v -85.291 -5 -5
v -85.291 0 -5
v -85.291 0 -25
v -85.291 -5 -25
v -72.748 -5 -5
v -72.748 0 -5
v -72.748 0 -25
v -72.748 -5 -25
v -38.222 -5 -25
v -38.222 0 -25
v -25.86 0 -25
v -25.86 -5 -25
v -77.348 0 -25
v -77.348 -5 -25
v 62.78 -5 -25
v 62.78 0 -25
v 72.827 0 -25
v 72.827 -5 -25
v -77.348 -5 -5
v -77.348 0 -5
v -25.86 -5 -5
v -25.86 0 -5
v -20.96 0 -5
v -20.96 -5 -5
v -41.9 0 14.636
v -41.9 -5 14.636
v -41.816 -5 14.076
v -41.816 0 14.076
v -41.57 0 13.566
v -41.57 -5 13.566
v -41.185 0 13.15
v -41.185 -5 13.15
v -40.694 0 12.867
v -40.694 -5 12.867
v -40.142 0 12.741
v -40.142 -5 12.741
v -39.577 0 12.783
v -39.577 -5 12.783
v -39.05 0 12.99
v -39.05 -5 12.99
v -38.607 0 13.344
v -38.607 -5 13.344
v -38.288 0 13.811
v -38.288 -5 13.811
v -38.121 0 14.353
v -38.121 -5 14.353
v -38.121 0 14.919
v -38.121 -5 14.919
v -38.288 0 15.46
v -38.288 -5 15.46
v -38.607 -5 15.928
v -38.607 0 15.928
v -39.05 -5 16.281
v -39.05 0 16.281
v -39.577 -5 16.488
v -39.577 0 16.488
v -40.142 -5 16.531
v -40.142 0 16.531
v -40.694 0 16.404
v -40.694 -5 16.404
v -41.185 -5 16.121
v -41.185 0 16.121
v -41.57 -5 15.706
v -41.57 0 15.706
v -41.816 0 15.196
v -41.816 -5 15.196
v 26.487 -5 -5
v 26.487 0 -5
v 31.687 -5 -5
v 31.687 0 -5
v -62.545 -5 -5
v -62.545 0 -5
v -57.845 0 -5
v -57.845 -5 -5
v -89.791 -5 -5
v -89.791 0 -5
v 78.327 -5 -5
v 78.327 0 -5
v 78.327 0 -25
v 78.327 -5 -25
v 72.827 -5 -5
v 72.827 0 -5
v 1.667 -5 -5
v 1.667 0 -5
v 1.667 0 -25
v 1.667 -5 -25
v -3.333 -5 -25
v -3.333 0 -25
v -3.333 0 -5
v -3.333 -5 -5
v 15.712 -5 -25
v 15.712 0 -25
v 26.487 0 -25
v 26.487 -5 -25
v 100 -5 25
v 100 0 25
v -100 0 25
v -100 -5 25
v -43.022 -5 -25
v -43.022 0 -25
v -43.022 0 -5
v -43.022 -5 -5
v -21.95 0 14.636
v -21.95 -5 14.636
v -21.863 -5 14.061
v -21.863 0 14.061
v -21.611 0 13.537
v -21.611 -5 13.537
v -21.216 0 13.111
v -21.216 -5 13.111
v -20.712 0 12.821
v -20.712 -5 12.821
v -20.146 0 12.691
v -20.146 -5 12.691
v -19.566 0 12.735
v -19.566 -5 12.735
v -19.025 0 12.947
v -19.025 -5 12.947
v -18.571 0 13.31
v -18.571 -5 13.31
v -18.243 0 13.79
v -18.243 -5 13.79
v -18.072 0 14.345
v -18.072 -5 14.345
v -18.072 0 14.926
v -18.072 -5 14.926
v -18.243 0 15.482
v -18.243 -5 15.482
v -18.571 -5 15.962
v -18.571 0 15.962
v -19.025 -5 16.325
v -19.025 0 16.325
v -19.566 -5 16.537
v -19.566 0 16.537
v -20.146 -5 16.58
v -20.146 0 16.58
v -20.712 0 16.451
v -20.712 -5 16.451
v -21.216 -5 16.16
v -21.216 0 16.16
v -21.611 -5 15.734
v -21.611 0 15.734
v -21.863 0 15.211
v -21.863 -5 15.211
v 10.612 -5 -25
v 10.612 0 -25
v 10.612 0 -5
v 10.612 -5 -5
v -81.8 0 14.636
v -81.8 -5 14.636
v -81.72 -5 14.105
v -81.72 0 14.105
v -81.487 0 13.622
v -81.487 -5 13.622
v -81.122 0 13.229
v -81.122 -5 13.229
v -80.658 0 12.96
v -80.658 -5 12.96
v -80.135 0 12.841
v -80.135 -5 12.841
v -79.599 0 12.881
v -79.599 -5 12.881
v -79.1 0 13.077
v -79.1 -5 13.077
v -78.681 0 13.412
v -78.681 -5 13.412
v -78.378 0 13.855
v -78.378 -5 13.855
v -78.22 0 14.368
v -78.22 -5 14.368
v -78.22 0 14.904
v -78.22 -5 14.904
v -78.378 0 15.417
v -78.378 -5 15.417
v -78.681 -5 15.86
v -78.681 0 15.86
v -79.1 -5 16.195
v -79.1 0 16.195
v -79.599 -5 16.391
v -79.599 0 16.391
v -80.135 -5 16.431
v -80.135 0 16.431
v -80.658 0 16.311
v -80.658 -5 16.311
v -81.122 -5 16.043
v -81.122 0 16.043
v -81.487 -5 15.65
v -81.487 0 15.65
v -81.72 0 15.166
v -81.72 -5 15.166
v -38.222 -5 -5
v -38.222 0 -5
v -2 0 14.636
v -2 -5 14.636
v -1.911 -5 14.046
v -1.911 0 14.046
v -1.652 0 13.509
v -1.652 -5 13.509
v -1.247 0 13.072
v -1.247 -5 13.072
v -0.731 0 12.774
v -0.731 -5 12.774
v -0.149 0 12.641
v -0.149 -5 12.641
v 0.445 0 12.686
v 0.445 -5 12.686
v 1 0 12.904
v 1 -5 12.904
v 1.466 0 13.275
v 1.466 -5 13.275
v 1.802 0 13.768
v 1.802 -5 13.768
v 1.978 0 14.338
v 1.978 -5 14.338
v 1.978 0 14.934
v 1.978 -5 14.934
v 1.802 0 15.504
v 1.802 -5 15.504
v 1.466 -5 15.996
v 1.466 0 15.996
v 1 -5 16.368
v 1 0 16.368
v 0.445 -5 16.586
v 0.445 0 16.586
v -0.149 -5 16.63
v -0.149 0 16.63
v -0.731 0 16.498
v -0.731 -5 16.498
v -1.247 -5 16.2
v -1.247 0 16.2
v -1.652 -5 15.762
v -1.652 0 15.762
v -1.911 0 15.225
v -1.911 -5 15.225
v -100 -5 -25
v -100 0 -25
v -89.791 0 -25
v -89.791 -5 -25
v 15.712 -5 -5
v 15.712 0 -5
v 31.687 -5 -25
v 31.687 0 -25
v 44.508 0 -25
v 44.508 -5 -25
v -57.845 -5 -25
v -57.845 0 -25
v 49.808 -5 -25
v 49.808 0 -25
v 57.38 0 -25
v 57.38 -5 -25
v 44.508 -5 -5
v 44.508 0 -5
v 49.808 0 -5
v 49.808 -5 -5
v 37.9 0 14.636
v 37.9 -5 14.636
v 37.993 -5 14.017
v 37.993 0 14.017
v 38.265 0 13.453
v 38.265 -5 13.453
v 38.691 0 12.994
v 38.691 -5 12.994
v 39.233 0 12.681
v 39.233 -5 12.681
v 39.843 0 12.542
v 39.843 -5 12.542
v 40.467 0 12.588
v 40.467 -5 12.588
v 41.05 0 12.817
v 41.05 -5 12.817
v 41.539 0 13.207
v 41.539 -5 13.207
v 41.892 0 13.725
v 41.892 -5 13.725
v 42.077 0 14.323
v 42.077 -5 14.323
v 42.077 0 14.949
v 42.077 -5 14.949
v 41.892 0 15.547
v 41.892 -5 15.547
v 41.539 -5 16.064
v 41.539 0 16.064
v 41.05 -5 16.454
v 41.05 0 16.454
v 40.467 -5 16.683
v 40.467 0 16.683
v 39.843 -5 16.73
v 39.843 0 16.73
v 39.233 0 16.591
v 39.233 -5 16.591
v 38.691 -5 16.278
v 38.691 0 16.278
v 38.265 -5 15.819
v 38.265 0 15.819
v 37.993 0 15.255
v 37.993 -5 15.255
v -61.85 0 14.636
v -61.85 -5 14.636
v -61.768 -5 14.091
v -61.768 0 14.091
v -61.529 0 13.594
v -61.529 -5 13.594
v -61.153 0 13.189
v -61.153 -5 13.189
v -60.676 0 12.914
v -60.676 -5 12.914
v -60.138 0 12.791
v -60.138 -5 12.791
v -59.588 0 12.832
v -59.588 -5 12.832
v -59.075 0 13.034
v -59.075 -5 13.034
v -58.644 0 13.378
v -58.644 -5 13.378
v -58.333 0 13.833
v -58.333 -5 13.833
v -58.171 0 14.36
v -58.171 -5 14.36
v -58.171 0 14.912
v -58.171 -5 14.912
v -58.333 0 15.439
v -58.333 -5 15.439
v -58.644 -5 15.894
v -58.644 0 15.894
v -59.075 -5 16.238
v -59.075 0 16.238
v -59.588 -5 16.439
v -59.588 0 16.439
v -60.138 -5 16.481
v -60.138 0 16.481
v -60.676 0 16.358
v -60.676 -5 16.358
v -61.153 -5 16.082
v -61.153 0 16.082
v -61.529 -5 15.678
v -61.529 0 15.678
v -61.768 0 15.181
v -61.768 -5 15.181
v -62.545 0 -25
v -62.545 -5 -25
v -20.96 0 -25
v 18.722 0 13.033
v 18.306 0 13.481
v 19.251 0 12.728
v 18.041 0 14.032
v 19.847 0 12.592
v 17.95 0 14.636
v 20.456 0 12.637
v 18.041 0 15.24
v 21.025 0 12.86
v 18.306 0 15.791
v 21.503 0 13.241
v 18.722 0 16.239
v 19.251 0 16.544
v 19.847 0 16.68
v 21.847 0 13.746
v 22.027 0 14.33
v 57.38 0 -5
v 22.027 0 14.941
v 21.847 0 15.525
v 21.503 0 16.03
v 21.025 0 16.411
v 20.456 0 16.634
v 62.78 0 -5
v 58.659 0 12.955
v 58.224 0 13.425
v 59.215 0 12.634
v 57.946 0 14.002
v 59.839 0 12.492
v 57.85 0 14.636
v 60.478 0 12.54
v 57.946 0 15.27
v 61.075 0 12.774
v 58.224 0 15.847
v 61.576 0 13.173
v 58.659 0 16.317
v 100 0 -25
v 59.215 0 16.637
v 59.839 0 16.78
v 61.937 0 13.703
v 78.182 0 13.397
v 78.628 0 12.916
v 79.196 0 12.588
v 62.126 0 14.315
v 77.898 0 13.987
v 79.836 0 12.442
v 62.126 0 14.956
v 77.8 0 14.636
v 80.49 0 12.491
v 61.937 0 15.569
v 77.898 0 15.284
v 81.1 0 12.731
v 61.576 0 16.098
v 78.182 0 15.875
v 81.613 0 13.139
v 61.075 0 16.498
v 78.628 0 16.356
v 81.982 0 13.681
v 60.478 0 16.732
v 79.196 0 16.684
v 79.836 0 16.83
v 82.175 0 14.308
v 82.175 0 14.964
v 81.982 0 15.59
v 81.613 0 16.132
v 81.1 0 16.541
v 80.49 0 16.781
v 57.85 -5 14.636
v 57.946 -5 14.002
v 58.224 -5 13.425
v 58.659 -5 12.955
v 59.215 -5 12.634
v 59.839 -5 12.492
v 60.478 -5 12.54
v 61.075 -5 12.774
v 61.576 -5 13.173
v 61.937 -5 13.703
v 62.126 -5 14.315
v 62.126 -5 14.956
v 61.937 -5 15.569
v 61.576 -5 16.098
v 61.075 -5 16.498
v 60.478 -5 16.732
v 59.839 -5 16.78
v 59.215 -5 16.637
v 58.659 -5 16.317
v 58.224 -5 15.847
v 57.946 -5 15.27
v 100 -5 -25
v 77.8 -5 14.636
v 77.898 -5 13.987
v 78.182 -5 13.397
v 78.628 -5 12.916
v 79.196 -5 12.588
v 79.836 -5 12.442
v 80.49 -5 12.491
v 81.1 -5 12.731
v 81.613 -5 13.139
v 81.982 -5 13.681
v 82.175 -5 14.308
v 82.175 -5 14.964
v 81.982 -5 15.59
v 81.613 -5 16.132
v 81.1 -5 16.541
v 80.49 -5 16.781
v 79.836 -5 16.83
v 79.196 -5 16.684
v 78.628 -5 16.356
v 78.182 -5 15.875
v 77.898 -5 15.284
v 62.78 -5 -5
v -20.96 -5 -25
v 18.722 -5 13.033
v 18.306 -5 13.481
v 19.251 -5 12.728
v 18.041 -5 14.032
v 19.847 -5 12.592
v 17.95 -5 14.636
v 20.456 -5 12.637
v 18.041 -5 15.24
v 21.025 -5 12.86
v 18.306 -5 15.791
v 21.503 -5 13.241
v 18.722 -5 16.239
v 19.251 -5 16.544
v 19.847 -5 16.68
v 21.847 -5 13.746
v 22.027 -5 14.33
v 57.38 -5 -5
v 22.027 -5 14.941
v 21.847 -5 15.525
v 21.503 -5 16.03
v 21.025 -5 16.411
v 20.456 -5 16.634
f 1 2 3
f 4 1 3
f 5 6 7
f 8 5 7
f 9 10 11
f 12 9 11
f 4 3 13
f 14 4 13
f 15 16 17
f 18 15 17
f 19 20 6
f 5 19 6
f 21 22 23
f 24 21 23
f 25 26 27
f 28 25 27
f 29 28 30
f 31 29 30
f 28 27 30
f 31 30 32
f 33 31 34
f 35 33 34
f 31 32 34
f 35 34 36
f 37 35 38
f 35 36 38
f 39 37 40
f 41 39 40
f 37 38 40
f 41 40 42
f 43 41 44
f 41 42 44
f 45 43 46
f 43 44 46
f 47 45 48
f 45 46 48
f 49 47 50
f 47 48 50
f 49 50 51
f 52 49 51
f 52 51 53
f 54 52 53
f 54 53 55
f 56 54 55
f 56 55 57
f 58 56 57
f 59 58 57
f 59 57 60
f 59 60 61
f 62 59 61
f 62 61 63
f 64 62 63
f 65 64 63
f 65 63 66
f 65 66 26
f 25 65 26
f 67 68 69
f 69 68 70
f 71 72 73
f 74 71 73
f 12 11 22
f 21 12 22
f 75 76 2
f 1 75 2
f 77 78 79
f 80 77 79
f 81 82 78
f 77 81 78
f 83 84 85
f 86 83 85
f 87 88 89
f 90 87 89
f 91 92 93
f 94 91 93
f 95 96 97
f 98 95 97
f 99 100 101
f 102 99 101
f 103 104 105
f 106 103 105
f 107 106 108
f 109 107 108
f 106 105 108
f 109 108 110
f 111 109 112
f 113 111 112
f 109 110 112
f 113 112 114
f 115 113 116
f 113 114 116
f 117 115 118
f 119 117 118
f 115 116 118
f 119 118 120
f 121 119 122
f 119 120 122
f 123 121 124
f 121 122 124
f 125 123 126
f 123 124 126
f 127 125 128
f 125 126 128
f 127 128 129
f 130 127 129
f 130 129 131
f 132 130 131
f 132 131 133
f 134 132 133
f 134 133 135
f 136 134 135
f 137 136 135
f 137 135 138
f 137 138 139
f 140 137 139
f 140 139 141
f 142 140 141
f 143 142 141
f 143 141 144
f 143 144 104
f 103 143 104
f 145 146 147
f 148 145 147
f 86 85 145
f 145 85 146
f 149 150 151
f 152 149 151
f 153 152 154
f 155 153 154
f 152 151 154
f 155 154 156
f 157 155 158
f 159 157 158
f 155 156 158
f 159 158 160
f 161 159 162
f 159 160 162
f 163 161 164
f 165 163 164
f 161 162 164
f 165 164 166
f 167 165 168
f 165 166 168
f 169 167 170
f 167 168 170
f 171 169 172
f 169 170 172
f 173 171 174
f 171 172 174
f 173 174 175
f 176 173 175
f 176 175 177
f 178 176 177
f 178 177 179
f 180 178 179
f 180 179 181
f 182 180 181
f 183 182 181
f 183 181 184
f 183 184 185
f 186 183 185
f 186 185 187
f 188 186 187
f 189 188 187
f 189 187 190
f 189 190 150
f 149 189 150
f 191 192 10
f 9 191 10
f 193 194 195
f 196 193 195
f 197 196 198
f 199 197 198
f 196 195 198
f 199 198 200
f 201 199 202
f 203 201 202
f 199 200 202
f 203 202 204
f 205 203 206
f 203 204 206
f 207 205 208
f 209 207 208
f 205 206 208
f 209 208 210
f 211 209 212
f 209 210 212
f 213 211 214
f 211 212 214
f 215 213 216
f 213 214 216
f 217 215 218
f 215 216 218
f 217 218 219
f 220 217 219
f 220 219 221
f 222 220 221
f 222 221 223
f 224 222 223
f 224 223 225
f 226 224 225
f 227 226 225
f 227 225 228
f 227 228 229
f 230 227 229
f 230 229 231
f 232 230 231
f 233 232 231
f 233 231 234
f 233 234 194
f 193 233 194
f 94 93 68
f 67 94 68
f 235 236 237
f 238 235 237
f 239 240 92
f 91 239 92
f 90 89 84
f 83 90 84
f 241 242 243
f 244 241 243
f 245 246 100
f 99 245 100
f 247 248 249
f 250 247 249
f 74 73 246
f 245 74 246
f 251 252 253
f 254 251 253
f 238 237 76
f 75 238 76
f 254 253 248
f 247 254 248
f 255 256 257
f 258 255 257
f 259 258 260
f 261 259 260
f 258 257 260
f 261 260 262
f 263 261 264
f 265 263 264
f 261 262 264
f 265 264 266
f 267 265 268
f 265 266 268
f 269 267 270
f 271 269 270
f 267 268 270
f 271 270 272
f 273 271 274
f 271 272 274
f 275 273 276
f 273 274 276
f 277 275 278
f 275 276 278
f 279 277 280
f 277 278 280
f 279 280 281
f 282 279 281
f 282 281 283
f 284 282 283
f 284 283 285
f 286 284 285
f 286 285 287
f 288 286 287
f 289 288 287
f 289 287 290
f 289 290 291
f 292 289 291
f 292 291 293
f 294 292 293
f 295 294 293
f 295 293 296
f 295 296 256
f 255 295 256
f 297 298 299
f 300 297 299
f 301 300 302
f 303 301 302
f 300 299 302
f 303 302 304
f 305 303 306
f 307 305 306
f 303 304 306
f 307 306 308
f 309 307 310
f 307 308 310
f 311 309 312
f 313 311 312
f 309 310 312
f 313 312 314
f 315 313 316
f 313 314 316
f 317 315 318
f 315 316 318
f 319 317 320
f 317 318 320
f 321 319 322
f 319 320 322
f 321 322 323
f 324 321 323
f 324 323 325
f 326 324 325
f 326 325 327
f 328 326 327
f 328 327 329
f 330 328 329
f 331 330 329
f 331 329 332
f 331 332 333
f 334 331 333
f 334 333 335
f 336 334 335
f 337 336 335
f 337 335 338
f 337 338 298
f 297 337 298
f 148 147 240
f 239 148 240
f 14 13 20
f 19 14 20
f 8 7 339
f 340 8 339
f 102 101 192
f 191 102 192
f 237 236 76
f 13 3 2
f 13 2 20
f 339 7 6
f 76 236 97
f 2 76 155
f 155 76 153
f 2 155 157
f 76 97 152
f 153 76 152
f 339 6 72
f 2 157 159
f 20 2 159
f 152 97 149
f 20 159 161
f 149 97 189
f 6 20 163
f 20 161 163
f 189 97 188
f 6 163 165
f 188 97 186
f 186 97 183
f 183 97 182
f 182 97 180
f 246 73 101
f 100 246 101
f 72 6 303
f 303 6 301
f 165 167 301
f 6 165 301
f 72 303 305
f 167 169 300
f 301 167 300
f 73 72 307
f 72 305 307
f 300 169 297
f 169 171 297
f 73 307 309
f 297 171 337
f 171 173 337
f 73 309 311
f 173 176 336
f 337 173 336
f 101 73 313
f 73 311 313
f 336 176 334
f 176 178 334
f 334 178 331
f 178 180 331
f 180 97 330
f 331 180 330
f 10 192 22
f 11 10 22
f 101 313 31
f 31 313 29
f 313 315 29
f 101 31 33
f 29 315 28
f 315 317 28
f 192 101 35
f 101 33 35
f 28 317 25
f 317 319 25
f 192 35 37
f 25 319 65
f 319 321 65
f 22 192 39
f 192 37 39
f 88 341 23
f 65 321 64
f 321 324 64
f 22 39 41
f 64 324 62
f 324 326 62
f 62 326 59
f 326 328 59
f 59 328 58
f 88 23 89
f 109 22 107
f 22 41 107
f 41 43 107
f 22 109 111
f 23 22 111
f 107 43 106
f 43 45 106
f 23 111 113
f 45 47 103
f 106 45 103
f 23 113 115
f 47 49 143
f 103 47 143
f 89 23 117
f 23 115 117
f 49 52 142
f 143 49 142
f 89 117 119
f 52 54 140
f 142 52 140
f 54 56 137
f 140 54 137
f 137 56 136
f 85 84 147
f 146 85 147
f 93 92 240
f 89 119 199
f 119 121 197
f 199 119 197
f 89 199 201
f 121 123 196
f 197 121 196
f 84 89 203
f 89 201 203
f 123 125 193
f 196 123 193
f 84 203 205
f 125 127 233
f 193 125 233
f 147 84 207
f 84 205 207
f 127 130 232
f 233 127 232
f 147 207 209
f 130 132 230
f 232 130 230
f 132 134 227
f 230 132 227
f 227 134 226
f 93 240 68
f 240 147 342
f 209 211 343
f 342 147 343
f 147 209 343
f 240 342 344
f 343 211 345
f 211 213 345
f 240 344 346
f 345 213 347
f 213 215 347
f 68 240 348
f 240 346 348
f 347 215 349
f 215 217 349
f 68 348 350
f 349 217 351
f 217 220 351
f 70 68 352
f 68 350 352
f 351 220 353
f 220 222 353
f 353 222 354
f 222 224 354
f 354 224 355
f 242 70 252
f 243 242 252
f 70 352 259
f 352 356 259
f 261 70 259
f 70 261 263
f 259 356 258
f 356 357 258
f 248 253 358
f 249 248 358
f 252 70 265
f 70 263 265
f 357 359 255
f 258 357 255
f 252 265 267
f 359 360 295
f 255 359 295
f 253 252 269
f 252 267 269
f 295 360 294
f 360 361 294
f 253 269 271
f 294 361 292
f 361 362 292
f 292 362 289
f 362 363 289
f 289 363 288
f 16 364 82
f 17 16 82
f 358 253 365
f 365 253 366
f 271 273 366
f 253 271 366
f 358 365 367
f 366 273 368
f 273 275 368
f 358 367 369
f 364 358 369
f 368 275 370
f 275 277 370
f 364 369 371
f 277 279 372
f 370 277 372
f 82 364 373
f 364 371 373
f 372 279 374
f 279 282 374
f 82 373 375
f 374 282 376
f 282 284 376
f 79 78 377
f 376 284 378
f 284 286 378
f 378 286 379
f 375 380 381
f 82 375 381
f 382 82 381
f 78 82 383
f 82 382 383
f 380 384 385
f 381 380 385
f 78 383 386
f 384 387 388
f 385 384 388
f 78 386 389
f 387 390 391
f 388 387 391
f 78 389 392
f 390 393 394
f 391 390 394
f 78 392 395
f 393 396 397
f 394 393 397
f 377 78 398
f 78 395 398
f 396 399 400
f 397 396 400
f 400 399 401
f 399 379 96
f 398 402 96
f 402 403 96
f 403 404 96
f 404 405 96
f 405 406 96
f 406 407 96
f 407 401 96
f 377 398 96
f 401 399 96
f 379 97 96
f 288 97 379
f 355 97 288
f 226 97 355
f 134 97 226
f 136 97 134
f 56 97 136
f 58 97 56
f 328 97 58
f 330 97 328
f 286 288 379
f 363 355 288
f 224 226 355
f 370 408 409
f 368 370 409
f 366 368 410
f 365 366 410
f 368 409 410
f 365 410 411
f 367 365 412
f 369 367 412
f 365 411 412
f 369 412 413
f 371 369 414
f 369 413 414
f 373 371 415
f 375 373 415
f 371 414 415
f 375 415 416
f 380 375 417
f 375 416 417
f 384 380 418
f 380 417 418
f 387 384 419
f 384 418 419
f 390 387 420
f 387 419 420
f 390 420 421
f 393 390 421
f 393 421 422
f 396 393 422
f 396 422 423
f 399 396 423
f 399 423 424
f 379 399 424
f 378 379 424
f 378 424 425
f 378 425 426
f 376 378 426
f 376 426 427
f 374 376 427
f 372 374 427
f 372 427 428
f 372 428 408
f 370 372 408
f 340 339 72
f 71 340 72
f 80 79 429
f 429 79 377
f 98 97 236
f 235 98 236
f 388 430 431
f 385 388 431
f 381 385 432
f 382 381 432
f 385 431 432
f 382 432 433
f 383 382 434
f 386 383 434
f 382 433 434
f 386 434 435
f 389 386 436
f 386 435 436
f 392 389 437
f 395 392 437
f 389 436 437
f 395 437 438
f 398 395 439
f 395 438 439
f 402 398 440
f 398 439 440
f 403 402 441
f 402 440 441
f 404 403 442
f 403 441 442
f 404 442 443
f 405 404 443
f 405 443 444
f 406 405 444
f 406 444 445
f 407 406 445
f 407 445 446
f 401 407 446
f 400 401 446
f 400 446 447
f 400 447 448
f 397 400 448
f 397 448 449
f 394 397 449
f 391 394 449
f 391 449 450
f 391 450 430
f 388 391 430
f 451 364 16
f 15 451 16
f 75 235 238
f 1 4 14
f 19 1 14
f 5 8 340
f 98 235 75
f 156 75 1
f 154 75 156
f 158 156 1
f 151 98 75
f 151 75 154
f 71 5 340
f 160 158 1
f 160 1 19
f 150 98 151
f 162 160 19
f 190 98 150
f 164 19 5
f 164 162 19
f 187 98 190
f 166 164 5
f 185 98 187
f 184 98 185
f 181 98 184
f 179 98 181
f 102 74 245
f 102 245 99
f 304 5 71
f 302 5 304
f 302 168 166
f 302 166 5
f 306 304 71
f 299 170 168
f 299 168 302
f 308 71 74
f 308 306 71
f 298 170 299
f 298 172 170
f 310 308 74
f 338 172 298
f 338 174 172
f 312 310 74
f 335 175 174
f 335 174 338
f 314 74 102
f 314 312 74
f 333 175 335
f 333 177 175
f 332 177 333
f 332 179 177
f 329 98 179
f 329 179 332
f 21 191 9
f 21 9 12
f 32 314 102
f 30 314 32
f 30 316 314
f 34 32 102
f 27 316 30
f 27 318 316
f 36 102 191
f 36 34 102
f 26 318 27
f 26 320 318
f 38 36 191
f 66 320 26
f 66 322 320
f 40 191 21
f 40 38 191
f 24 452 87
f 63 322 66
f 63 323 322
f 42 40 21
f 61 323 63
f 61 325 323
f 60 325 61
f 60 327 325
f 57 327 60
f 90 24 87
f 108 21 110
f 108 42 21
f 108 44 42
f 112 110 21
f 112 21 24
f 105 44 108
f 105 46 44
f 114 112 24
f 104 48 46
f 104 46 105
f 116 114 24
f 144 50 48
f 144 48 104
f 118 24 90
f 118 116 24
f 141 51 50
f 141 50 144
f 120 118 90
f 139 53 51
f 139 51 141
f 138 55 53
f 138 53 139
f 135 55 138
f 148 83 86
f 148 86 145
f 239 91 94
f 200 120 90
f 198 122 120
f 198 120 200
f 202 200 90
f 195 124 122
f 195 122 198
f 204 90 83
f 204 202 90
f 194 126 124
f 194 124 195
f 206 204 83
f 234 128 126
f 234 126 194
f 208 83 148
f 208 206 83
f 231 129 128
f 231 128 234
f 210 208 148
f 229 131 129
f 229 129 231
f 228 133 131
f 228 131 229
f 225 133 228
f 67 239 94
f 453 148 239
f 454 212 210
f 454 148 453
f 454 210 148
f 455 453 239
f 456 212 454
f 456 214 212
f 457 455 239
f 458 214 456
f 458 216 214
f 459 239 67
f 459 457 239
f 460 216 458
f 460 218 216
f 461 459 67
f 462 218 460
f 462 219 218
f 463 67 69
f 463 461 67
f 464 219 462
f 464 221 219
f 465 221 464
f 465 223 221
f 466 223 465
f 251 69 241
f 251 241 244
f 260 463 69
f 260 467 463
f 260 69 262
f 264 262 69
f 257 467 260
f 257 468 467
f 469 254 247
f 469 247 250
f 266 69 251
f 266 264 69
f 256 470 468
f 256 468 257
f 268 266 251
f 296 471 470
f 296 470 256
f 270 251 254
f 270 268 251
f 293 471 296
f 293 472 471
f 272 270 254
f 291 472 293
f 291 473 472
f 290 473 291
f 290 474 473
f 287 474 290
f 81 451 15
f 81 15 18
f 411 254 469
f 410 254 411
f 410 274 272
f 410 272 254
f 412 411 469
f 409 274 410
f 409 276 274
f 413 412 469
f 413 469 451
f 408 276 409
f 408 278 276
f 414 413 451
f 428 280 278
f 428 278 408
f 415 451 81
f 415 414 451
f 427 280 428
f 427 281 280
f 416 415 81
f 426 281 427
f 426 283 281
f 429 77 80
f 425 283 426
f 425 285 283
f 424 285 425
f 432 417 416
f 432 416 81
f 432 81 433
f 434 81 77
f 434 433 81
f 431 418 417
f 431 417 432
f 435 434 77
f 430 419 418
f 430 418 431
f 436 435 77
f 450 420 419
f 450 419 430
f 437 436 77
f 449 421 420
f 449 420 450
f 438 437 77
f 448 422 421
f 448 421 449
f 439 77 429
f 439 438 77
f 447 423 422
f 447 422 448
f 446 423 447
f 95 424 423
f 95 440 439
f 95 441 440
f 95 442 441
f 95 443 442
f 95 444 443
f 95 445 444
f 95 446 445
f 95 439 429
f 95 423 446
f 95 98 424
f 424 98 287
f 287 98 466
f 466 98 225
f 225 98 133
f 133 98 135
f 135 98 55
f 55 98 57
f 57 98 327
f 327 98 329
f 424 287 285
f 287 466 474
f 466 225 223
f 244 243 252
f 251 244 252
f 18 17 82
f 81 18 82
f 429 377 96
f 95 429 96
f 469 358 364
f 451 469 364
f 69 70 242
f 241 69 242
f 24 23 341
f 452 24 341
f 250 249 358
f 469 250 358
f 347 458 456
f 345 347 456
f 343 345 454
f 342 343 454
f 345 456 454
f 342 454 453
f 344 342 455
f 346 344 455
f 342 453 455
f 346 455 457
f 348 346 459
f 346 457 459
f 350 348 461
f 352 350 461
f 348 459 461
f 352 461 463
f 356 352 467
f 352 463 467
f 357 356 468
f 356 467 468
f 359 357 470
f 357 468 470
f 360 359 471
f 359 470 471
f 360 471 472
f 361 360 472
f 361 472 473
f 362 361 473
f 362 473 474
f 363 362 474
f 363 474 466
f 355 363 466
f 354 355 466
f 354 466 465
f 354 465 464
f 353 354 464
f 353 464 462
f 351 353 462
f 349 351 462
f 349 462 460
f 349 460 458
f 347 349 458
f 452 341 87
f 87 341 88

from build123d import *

# Parameters (mm, degrees)
F1_DEPTH = 5
F3_D     = 4
F4_D     = 4.1
F5_D     = 4.2
F6_D     = 4.3
F7_D     = 4.4
F8_D     = 3.9
F9_D     = 3.8
F10_D    = 3.7
F11_D    = 3.6


with BuildPart() as f1:
    # F0 (on Front) → F1 (new body)
    with BuildSketch(Plane.XZ):
        Polygon((100, -25), (100, 25), (-100, 25), (-100, -25), (-89.7911712527, -25), (-89.7911712527, -5), (-85.2911712527, -5), (-85.2911712527, -25), (-77.3481056094, -25), (-77.3481056094, -5), (-72.7481056094, -5), (-72.7481056094, -25), (-62.5451430678, -25), (-62.5451430678, -5), (-57.8451430678, -5), (-57.8451430678, -25), (-43.0224016309, -25), (-43.0224016309, -5), (-38.2224016309, -5), (-38.2224016309, -25), (-25.8595496416, -25), (-25.8595496416, -5), (-20.9595496416, -5), (-20.9595496416, -25), (-3.3333026804, -25), (-3.3333026804, -5), (1.6666973196, -5), (1.6666973196, -25), (10.6115136296, -25), (10.6115136296, -5), (15.7115136296, -5), (15.7115136296, -25), (26.4871511608, -25), (26.4871511608, -5), (31.6871511608, -5), (31.6871511608, -25), (44.50815171, -25), (44.50815171, -5), (49.80815171, -5), (49.80815171, -25), (57.3802888393, -25), (57.3802888393, -5), (62.7802888393, -5), (62.7802888393, -25), (72.8268548846, -25), (72.8268548846, -5), (78.3268548846, -5), (78.3268548846, -25), align=None)
    extrude(amount=F1_DEPTH)

    # F3 (through all)
    with Locations(Plane(origin=(0, 0, 0), x_dir=(1, 0, 0), z_dir=(0, 1, 0))):
        with Locations((0, -14.6358385682)):
            Hole(F3_D / 2)

    # F4 (through all)
    with Locations(Plane(origin=(0, 0, 0), x_dir=(1, 0, 0), z_dir=(0, 1, 0))):
        with Locations((20, -14.6358385682)):
            Hole(F4_D / 2)

    # F5 (through all)
    with Locations(Plane(origin=(0, 0, 0), x_dir=(1, 0, 0), z_dir=(0, 1, 0))):
        with Locations((40, -14.6358385682)):
            Hole(F5_D / 2)

    # F6 (through all)
    with Locations(Plane(origin=(0, 0, 0), x_dir=(1, 0, 0), z_dir=(0, 1, 0))):
        with Locations((60, -14.6358385682)):
            Hole(F6_D / 2)

    # F7 (through all)
    with Locations(Plane(origin=(0, 0, 0), x_dir=(1, 0, 0), z_dir=(0, 1, 0))):
        with Locations((80, -14.6358385682)):
            Hole(F7_D / 2)

    # F8 (through all)
    with Locations(Plane(origin=(0, 0, 0), x_dir=(1, 0, 0), z_dir=(0, 1, 0))):
        with Locations((-20, -14.6358385682)):
            Hole(F8_D / 2)

    # F9 (through all)
    with Locations(Plane(origin=(0, 0, 0), x_dir=(1, 0, 0), z_dir=(0, 1, 0))):
        with Locations((-40, -14.6358385682)):
            Hole(F9_D / 2)

    # F10 (through all)
    with Locations(Plane(origin=(0, 0, 0), x_dir=(1, 0, 0), z_dir=(0, 1, 0))):
        with Locations((-60, -14.6358385682)):
            Hole(F10_D / 2)

    # F11 (through all)
    with Locations(Plane(origin=(0, 0, 0), x_dir=(1, 0, 0), z_dir=(0, 1, 0))):
        with Locations((-80, -14.6358385682)):
            Hole(F11_D / 2)


solid = f1.part
